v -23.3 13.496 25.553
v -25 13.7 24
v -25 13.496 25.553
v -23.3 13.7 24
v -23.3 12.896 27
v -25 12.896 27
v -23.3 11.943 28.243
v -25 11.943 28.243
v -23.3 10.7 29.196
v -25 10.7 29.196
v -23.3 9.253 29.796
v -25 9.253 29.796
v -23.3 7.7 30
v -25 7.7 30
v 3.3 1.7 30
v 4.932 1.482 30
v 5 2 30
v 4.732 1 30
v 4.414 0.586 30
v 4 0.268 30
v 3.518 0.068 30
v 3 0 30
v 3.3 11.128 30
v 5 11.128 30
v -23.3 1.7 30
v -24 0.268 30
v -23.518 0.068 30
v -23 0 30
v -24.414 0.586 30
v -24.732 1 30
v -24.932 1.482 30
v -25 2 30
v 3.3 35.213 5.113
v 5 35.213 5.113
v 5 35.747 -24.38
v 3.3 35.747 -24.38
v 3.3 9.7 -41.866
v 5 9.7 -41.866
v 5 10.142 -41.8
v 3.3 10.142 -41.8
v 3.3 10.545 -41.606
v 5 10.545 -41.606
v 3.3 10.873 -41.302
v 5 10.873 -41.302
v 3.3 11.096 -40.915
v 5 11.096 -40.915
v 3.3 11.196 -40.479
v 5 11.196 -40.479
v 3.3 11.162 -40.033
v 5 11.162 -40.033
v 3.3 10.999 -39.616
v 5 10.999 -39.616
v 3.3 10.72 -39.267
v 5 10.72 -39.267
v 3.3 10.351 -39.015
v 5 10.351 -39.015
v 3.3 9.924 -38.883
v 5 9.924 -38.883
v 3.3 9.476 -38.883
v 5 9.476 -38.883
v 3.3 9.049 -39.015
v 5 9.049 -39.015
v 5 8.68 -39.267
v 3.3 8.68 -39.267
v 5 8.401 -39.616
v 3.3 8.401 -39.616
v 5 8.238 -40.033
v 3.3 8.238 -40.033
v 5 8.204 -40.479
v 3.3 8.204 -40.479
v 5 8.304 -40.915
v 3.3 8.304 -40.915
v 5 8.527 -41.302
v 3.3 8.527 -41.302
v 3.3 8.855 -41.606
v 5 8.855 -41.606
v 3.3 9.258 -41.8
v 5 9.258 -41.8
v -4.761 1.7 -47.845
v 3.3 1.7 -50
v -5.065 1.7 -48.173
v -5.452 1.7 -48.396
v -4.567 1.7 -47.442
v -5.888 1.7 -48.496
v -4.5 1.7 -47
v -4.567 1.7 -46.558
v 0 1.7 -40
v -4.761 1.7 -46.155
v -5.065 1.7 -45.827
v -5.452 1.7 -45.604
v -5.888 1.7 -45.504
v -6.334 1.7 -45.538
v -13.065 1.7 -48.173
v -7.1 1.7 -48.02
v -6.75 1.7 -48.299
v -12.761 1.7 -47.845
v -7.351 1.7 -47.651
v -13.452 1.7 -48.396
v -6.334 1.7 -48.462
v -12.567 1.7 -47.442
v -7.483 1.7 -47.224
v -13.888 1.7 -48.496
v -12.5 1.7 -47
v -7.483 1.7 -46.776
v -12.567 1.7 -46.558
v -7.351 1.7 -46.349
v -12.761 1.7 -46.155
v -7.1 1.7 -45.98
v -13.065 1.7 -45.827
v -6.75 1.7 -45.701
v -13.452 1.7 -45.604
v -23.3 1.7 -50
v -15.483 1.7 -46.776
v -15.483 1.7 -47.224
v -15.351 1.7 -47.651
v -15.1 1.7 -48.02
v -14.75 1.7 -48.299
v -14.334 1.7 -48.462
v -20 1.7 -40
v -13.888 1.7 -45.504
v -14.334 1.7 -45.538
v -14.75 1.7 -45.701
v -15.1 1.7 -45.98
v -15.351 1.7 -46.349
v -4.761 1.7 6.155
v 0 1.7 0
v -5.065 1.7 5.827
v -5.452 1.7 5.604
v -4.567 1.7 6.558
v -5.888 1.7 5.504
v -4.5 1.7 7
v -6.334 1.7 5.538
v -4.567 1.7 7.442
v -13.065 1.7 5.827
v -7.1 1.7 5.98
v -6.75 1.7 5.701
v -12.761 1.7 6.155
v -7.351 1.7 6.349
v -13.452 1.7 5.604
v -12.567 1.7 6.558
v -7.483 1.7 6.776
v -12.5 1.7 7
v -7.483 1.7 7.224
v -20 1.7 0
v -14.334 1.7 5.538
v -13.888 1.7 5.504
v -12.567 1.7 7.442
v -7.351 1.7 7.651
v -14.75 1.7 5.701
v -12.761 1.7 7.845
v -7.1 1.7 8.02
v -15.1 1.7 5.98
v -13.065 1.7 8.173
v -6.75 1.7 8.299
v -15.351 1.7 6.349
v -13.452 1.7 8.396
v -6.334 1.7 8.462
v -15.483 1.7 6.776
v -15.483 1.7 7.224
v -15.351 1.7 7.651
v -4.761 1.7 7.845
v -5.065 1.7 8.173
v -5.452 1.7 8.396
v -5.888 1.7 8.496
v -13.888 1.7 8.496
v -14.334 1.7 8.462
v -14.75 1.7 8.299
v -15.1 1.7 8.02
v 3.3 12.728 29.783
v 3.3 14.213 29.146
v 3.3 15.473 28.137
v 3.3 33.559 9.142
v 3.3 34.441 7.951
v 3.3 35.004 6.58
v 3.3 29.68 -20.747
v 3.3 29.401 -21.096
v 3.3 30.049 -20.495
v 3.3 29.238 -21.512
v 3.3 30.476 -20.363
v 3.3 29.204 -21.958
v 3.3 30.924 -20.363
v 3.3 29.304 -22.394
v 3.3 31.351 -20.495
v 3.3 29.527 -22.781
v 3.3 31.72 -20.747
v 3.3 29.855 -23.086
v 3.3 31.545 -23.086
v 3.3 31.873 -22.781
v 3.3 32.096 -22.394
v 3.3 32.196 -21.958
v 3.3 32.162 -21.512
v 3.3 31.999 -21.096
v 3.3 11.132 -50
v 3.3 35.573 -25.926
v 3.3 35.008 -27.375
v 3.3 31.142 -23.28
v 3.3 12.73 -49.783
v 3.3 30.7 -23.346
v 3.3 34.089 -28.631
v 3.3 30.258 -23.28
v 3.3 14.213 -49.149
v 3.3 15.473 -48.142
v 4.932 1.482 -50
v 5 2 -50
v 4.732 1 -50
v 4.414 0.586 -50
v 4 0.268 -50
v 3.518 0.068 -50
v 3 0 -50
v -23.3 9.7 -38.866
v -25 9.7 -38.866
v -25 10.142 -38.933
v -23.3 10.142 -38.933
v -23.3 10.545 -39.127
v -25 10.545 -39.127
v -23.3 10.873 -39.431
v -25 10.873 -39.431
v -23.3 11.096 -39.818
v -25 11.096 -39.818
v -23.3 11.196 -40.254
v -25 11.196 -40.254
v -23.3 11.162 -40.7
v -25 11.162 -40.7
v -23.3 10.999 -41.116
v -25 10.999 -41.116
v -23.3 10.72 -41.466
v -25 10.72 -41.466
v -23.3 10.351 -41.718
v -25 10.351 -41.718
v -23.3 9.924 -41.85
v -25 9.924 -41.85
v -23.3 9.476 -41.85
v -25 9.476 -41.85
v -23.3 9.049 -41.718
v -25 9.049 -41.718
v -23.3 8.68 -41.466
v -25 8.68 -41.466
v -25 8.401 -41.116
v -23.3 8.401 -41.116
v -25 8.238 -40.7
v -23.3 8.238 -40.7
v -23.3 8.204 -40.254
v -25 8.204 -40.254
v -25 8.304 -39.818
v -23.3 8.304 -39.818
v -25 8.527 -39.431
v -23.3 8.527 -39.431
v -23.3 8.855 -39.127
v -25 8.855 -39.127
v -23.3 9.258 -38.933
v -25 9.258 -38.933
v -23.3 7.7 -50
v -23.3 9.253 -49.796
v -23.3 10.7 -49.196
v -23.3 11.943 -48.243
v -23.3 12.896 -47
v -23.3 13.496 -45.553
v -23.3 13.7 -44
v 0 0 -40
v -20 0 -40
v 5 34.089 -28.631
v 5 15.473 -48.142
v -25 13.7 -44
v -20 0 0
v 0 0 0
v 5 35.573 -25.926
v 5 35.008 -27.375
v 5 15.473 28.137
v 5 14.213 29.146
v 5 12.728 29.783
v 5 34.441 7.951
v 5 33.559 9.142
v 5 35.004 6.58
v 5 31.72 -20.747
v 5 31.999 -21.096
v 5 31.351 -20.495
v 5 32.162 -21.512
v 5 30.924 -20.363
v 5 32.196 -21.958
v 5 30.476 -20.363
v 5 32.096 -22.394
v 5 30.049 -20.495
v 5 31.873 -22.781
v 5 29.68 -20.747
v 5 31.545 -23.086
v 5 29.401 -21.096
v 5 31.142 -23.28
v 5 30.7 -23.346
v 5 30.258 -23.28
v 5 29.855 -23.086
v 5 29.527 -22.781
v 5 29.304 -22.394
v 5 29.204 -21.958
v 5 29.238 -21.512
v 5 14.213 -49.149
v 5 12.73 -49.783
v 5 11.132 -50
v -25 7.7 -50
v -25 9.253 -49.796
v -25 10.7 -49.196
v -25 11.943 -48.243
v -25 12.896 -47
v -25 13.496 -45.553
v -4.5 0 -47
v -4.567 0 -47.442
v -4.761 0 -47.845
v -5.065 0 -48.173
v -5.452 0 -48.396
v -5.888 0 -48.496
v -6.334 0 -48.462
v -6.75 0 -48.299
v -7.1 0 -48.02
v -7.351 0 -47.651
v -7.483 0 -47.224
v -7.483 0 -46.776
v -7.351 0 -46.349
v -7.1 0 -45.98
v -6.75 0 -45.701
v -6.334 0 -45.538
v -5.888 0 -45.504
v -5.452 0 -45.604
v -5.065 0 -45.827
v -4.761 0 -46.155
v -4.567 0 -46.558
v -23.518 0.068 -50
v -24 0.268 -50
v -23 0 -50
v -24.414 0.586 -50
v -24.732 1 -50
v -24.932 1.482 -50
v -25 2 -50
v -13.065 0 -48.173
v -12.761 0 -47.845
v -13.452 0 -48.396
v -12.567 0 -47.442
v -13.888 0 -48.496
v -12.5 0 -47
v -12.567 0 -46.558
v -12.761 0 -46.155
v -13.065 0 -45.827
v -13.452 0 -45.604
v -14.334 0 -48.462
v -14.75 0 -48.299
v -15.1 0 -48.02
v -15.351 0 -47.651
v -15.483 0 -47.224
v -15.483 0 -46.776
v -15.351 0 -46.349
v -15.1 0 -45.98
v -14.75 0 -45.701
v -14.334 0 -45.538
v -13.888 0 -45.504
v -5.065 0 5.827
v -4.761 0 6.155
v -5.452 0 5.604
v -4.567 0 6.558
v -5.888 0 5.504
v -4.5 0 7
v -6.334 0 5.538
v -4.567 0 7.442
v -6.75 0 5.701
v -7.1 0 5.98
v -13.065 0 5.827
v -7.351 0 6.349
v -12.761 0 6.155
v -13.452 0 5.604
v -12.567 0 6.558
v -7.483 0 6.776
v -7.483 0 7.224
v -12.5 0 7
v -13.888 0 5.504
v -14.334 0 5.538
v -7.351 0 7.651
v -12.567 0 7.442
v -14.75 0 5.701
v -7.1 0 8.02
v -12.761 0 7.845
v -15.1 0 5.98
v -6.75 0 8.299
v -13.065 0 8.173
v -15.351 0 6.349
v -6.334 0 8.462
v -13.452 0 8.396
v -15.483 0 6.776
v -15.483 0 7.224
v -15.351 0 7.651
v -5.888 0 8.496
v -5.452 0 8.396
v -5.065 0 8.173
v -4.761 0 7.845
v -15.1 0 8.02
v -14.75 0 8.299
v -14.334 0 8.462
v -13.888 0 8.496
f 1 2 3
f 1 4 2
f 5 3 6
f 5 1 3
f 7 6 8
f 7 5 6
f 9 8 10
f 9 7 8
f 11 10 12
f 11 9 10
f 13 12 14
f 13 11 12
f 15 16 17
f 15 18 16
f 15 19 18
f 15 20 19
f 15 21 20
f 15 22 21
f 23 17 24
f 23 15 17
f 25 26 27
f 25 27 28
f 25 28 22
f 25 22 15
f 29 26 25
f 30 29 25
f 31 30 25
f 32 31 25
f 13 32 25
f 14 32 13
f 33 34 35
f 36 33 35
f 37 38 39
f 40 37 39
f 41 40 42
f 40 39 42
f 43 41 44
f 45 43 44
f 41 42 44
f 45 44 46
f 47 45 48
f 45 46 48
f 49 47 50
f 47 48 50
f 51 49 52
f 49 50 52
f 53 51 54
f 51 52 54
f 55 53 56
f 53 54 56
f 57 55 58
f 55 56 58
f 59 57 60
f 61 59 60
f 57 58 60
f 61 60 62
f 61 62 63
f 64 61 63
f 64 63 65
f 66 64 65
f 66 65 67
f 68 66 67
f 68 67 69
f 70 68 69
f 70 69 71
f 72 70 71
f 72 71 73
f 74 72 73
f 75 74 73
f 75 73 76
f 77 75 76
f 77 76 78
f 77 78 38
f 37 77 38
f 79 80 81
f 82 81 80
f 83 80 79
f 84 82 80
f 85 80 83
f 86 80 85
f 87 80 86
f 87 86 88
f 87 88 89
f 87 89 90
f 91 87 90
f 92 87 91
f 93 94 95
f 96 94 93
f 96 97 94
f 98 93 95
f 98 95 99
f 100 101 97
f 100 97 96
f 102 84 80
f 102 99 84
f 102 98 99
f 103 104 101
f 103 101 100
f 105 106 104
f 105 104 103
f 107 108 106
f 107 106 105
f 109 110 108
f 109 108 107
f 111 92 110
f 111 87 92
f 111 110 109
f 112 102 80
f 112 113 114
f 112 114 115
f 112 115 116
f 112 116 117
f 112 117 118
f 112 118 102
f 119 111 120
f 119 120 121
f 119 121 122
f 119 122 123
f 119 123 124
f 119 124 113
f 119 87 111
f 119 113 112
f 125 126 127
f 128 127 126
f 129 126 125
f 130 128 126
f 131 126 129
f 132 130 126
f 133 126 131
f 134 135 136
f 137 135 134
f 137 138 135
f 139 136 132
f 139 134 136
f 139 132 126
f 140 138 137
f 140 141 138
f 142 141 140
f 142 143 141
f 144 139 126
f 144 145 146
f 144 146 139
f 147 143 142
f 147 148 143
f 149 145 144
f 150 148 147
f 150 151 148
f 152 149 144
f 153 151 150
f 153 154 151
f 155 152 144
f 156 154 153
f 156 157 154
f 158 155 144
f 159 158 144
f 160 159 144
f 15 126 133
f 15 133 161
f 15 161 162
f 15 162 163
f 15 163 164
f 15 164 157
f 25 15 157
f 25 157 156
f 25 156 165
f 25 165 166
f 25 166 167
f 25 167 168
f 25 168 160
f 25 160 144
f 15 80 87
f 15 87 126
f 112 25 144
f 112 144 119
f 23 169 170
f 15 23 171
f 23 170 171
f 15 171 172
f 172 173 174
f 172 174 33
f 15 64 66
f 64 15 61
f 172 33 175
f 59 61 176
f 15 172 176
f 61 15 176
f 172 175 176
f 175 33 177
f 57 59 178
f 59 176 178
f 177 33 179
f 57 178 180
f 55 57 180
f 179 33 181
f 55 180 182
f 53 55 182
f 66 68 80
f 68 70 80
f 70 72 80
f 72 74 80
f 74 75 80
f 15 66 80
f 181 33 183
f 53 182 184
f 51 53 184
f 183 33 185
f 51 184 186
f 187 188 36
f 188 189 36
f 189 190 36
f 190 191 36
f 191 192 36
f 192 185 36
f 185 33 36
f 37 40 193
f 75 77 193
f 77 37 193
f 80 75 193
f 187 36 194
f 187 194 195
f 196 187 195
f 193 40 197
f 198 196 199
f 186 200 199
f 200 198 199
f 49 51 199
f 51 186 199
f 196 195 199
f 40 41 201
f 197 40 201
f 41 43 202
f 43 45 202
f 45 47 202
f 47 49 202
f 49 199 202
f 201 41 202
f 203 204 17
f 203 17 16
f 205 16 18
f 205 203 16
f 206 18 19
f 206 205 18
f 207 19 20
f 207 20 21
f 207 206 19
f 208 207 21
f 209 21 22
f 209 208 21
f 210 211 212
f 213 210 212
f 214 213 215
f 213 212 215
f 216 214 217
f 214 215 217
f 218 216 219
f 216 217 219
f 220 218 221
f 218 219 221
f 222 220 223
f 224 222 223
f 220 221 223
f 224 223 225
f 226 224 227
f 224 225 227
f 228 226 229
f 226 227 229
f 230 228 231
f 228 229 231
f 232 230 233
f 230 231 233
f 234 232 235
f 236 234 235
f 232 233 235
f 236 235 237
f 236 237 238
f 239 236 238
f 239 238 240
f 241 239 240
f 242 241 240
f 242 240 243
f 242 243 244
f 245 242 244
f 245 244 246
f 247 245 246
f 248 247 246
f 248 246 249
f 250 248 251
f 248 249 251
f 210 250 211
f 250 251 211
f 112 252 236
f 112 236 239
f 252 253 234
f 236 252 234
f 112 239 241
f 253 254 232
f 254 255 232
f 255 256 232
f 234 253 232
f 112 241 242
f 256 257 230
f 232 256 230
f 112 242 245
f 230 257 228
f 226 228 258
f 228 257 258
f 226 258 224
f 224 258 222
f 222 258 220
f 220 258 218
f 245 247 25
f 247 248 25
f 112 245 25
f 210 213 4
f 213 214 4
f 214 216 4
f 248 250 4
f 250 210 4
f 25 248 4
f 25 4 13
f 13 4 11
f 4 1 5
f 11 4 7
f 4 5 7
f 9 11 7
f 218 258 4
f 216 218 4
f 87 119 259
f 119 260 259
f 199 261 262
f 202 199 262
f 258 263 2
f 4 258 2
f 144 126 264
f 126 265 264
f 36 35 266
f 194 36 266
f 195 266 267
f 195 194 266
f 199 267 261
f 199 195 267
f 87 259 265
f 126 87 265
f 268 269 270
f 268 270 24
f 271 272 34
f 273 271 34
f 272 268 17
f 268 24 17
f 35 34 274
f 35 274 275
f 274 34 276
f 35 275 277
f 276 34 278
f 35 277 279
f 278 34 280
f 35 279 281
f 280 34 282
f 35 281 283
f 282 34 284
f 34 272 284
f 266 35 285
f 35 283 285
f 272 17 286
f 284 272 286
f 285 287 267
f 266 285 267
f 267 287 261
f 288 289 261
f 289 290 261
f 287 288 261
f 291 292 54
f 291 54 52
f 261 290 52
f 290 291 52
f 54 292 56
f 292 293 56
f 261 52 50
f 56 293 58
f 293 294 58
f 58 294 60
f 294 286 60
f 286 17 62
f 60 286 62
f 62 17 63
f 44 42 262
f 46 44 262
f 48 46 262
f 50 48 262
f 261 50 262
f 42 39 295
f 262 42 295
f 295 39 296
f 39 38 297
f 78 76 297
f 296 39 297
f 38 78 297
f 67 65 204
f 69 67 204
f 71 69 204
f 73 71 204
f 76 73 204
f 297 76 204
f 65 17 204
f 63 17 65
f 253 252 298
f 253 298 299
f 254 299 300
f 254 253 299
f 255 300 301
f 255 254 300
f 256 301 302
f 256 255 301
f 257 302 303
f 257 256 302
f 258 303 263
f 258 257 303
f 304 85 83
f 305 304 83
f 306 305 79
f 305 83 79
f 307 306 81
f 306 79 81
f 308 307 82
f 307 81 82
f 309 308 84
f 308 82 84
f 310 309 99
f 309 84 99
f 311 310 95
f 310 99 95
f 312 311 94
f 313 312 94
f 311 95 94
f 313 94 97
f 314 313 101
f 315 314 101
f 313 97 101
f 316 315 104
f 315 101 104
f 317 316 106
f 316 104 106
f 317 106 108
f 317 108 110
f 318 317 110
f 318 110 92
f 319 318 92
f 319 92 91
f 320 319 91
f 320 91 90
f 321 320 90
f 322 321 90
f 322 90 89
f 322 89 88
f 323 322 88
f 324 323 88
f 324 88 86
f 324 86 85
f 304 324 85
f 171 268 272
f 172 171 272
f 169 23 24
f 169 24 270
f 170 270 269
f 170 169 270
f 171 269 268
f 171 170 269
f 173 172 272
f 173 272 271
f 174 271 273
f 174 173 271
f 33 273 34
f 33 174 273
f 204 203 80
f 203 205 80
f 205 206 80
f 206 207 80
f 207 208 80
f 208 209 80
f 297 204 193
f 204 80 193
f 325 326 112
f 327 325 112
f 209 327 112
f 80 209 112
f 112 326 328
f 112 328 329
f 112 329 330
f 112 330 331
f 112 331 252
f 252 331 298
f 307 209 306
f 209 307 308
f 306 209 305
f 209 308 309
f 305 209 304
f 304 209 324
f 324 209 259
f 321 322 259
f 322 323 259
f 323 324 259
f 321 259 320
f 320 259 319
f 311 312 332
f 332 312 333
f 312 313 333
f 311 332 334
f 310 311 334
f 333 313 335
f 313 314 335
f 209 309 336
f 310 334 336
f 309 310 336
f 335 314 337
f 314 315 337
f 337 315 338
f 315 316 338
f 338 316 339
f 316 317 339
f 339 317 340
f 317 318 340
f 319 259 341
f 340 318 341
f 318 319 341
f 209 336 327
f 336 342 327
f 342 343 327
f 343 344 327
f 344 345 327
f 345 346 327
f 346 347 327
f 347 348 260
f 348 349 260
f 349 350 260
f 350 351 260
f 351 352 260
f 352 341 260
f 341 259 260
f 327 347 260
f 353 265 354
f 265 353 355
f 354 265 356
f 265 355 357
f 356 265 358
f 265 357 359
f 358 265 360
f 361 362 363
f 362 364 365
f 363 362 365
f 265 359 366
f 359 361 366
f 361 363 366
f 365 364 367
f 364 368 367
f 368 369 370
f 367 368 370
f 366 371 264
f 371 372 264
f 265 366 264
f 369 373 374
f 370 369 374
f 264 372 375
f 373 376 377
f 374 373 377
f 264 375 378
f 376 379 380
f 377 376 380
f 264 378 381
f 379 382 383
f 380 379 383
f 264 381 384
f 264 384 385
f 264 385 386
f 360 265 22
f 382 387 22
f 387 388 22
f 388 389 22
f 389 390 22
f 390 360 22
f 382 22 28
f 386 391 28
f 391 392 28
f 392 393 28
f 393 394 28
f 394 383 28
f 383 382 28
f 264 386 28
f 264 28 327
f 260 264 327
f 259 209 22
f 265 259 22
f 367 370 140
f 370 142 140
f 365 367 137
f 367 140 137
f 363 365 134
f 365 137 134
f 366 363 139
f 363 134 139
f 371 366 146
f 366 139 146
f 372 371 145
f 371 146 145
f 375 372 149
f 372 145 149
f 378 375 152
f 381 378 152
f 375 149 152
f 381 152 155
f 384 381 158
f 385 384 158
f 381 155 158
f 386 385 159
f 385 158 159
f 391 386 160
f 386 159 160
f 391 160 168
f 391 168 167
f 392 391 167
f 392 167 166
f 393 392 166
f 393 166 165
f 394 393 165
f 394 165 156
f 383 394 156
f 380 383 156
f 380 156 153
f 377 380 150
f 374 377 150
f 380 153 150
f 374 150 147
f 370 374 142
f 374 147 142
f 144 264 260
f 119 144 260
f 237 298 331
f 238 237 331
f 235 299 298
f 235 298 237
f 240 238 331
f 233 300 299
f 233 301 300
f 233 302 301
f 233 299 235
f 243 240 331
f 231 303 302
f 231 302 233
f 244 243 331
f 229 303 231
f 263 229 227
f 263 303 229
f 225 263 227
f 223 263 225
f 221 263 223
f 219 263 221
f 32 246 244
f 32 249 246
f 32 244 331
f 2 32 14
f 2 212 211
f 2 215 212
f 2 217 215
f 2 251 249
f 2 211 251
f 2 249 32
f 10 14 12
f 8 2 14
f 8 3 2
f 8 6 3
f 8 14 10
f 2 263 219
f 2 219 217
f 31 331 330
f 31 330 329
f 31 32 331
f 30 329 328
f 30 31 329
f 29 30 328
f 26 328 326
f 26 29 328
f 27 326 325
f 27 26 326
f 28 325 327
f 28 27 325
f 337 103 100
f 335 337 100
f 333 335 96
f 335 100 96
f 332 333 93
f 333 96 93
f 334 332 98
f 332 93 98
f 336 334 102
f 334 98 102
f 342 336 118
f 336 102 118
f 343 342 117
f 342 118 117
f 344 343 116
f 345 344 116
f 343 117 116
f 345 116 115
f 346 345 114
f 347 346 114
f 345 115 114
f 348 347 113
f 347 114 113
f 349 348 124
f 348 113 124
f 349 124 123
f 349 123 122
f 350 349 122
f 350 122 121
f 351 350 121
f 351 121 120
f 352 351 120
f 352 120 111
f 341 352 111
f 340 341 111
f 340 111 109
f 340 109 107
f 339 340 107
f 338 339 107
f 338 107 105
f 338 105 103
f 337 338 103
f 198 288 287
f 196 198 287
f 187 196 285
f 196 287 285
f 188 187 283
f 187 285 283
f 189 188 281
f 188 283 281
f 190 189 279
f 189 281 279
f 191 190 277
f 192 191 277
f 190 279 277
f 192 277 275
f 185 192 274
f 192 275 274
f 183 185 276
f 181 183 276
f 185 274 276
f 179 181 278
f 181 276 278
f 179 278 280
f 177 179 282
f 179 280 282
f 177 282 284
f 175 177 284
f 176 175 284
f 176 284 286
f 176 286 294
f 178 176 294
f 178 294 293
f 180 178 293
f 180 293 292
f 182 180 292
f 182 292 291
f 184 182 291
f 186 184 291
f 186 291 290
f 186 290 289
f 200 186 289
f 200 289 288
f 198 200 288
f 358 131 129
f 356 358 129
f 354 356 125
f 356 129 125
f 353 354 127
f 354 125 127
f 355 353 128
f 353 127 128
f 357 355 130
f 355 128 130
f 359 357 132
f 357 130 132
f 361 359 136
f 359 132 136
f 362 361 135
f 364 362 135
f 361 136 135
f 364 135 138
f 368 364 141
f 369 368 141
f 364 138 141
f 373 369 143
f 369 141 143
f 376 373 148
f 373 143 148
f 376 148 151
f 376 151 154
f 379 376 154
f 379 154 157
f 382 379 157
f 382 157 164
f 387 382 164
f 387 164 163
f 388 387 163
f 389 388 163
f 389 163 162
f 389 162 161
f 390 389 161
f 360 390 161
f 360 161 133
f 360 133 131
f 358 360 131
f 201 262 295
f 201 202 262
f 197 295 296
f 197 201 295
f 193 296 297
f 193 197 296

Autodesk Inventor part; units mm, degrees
ref_plane "YZ Plane" through (0, 0, 0) normal (1, 0, 0) x (0, 1, 0)
ref_plane "XZ Plane" through (0, 0, 0) normal (0, 1, 0) x (-1, 0, 0)
ref_plane "XY Plane" through (0, 0, 0) normal (0, 0, 1) x (1, 0, 0)
sketch "Sketch1" plane through (0, 0, 0) normal (0, 1, 0) x (-1, 0, 0)
  line L0 (0, 0) -> (20, 0)
  line L1 (20, 0) -> (20, -40)
  line L2 (20, -40) -> (0, -40)
  line L3 (0, -40) -> (0, 0)
  line L4 (25, 30) -> (-5, 30)
  line L5 (-5, 30) -> (-5, -50)
  line L6 (-5, -50) -> (25, -50)
  line L7 (25, -50) -> (25, 30)
  dimension "d0" = 20
  dimension "d1" = 40
  dimension "d2" = 30
  dimension "d3" = 30
  dimension "d4" = 10
  dimension "d5" = 5
extrude "Extrusion1" add sketch "Sketch1" along normal blind 1.7
sketch "Sketch2" plane through (5, 0, 30) normal (1, 0, 0) x (0, 0, -1)
  line L0 (0, 0) -> (0, 1.7) projected
  line L1 (0, 1.7) -> (0, 13.7)
  line L2 (0, 13.7) -> (22.5503, 35.1708)
  line L3 (22.5503, 35.1708) -> (56.8462, 35.7913)
  line L4 (56.8462, 35.7913) -> (80, 13.7)
  line L5 (80, 0) -> (80, 1.7) projected
  line L6 (80, 13.7) -> (80, 1.7)
  line L7 (0, 1.7) -> (80, 1.7) projected
  circle A0 centre (70.3665, 9.7) radius 1.5
  circle A1 centre (70.3665, 9.7) radius 28
  line L8 (24.8863, 30.7) -> (59.3173, 30.7)
  circle A2 centre (51.8462, 30.7) radius 1.5
  point P0 (30, 0)
  dimension "d11" = 56
  dimension "d8" = 0
  dimension "d9" = 3
  dimension "d10" = 8
  dimension "d12" = 29
  dimension "d13" = 3
  dimension "d14" = 5
  dimension "d15" = 5
  dimension "d16" = 12
  dimension "d19" = 12
extrude "Extrusion2" add sketch "Sketch2" against normal blind 1.7 contours L1 L2 L3 L4 A1 A2 L7 | A1 A2 L4 L6 L7
sketch "Sketch3" plane through (-25, 0, -50) normal (-1, 0, 0) x (0, 0, 1)
  line L0 (0, 0) -> (0, 13.7) projected
  line L1 (23.1538, 35.7913) -> (0, 13.7) projected
  line L2 (0, 1.667) -> (0, 13.7)
  line L3 (0, 13.7) -> (80, 13.7)
  line L4 (80, 1.7) -> (0, 1.7) projected
  line L5 (80, 0) -> (80, 1.7) projected
  line L6 (0, 1.7) -> (80, 1.7)
  line L7 (80, 1.7) -> (80, 13.7)
  circle A0 centre (9.6335, 9.7) radius 1.5 projected
  circle A1 centre (9.6335, 9.7) radius 1.5
  point P0 (50, 0)
  dimension "d20" = 80
  dimension "d21" = 3
extrude "Extrusion3" add sketch "Sketch3" against normal blind 1.7
fillet "Fillet1" radius 2 2 edges at (-25, 0, -10) (5, 0, -10)
fillet "Fillet2" radius 6 6 edges at (4.15, 13.7, 30) (4.15, 35.1708, 7.4497) (4.15, 35.7913, -26.8462) (4.15, 13.7, -50) (-24.15, 13.7, -50) (-24.15, 13.7, 30)
sketch "Sketch4" plane through (0, 1.7, 0) normal (0, 1, 0) x (1, 0, 0)
  line L0 (-6, 47) -> (-14, 47)
  line L1 (-14, 47) -> (-14, -7)
  line L2 (-14, -7) -> (-6, -7)
  line L3 (-6, -7) -> (-6, 47)
  line L4 (-20, 0) -> (-20, 40) projected
  line L5 (-20, 40) -> (0, 40) projected
  circle A0 centre (-6, 47) radius 1.5
  circle A1 centre (-14, 47) radius 1.5
  circle A2 centre (-6, -7) radius 1.5
  circle A3 centre (-14, -7) radius 1.5
  point P0 (0, 0)
  point P1 (-10, 40)
  dimension "d26" = 8
  dimension "d27" = 54
  dimension "d28" = 6
  dimension "d29" = 7
  dimension "d30" = 3
  dimension "d31" = 3
  dimension "d32" = 3
  dimension "d33" = 3
extrude "Extrusion4" cut sketch "Sketch4" against normal through all contours A1 L1 L0 | L0 L1 A1 | A0 L3 L0 | L0 L3 A0 | A3 L2 L1 | L1 L2 A3 | A2 L2 L3 | L3 L2 A2
properties part number "gripper servo mount"
